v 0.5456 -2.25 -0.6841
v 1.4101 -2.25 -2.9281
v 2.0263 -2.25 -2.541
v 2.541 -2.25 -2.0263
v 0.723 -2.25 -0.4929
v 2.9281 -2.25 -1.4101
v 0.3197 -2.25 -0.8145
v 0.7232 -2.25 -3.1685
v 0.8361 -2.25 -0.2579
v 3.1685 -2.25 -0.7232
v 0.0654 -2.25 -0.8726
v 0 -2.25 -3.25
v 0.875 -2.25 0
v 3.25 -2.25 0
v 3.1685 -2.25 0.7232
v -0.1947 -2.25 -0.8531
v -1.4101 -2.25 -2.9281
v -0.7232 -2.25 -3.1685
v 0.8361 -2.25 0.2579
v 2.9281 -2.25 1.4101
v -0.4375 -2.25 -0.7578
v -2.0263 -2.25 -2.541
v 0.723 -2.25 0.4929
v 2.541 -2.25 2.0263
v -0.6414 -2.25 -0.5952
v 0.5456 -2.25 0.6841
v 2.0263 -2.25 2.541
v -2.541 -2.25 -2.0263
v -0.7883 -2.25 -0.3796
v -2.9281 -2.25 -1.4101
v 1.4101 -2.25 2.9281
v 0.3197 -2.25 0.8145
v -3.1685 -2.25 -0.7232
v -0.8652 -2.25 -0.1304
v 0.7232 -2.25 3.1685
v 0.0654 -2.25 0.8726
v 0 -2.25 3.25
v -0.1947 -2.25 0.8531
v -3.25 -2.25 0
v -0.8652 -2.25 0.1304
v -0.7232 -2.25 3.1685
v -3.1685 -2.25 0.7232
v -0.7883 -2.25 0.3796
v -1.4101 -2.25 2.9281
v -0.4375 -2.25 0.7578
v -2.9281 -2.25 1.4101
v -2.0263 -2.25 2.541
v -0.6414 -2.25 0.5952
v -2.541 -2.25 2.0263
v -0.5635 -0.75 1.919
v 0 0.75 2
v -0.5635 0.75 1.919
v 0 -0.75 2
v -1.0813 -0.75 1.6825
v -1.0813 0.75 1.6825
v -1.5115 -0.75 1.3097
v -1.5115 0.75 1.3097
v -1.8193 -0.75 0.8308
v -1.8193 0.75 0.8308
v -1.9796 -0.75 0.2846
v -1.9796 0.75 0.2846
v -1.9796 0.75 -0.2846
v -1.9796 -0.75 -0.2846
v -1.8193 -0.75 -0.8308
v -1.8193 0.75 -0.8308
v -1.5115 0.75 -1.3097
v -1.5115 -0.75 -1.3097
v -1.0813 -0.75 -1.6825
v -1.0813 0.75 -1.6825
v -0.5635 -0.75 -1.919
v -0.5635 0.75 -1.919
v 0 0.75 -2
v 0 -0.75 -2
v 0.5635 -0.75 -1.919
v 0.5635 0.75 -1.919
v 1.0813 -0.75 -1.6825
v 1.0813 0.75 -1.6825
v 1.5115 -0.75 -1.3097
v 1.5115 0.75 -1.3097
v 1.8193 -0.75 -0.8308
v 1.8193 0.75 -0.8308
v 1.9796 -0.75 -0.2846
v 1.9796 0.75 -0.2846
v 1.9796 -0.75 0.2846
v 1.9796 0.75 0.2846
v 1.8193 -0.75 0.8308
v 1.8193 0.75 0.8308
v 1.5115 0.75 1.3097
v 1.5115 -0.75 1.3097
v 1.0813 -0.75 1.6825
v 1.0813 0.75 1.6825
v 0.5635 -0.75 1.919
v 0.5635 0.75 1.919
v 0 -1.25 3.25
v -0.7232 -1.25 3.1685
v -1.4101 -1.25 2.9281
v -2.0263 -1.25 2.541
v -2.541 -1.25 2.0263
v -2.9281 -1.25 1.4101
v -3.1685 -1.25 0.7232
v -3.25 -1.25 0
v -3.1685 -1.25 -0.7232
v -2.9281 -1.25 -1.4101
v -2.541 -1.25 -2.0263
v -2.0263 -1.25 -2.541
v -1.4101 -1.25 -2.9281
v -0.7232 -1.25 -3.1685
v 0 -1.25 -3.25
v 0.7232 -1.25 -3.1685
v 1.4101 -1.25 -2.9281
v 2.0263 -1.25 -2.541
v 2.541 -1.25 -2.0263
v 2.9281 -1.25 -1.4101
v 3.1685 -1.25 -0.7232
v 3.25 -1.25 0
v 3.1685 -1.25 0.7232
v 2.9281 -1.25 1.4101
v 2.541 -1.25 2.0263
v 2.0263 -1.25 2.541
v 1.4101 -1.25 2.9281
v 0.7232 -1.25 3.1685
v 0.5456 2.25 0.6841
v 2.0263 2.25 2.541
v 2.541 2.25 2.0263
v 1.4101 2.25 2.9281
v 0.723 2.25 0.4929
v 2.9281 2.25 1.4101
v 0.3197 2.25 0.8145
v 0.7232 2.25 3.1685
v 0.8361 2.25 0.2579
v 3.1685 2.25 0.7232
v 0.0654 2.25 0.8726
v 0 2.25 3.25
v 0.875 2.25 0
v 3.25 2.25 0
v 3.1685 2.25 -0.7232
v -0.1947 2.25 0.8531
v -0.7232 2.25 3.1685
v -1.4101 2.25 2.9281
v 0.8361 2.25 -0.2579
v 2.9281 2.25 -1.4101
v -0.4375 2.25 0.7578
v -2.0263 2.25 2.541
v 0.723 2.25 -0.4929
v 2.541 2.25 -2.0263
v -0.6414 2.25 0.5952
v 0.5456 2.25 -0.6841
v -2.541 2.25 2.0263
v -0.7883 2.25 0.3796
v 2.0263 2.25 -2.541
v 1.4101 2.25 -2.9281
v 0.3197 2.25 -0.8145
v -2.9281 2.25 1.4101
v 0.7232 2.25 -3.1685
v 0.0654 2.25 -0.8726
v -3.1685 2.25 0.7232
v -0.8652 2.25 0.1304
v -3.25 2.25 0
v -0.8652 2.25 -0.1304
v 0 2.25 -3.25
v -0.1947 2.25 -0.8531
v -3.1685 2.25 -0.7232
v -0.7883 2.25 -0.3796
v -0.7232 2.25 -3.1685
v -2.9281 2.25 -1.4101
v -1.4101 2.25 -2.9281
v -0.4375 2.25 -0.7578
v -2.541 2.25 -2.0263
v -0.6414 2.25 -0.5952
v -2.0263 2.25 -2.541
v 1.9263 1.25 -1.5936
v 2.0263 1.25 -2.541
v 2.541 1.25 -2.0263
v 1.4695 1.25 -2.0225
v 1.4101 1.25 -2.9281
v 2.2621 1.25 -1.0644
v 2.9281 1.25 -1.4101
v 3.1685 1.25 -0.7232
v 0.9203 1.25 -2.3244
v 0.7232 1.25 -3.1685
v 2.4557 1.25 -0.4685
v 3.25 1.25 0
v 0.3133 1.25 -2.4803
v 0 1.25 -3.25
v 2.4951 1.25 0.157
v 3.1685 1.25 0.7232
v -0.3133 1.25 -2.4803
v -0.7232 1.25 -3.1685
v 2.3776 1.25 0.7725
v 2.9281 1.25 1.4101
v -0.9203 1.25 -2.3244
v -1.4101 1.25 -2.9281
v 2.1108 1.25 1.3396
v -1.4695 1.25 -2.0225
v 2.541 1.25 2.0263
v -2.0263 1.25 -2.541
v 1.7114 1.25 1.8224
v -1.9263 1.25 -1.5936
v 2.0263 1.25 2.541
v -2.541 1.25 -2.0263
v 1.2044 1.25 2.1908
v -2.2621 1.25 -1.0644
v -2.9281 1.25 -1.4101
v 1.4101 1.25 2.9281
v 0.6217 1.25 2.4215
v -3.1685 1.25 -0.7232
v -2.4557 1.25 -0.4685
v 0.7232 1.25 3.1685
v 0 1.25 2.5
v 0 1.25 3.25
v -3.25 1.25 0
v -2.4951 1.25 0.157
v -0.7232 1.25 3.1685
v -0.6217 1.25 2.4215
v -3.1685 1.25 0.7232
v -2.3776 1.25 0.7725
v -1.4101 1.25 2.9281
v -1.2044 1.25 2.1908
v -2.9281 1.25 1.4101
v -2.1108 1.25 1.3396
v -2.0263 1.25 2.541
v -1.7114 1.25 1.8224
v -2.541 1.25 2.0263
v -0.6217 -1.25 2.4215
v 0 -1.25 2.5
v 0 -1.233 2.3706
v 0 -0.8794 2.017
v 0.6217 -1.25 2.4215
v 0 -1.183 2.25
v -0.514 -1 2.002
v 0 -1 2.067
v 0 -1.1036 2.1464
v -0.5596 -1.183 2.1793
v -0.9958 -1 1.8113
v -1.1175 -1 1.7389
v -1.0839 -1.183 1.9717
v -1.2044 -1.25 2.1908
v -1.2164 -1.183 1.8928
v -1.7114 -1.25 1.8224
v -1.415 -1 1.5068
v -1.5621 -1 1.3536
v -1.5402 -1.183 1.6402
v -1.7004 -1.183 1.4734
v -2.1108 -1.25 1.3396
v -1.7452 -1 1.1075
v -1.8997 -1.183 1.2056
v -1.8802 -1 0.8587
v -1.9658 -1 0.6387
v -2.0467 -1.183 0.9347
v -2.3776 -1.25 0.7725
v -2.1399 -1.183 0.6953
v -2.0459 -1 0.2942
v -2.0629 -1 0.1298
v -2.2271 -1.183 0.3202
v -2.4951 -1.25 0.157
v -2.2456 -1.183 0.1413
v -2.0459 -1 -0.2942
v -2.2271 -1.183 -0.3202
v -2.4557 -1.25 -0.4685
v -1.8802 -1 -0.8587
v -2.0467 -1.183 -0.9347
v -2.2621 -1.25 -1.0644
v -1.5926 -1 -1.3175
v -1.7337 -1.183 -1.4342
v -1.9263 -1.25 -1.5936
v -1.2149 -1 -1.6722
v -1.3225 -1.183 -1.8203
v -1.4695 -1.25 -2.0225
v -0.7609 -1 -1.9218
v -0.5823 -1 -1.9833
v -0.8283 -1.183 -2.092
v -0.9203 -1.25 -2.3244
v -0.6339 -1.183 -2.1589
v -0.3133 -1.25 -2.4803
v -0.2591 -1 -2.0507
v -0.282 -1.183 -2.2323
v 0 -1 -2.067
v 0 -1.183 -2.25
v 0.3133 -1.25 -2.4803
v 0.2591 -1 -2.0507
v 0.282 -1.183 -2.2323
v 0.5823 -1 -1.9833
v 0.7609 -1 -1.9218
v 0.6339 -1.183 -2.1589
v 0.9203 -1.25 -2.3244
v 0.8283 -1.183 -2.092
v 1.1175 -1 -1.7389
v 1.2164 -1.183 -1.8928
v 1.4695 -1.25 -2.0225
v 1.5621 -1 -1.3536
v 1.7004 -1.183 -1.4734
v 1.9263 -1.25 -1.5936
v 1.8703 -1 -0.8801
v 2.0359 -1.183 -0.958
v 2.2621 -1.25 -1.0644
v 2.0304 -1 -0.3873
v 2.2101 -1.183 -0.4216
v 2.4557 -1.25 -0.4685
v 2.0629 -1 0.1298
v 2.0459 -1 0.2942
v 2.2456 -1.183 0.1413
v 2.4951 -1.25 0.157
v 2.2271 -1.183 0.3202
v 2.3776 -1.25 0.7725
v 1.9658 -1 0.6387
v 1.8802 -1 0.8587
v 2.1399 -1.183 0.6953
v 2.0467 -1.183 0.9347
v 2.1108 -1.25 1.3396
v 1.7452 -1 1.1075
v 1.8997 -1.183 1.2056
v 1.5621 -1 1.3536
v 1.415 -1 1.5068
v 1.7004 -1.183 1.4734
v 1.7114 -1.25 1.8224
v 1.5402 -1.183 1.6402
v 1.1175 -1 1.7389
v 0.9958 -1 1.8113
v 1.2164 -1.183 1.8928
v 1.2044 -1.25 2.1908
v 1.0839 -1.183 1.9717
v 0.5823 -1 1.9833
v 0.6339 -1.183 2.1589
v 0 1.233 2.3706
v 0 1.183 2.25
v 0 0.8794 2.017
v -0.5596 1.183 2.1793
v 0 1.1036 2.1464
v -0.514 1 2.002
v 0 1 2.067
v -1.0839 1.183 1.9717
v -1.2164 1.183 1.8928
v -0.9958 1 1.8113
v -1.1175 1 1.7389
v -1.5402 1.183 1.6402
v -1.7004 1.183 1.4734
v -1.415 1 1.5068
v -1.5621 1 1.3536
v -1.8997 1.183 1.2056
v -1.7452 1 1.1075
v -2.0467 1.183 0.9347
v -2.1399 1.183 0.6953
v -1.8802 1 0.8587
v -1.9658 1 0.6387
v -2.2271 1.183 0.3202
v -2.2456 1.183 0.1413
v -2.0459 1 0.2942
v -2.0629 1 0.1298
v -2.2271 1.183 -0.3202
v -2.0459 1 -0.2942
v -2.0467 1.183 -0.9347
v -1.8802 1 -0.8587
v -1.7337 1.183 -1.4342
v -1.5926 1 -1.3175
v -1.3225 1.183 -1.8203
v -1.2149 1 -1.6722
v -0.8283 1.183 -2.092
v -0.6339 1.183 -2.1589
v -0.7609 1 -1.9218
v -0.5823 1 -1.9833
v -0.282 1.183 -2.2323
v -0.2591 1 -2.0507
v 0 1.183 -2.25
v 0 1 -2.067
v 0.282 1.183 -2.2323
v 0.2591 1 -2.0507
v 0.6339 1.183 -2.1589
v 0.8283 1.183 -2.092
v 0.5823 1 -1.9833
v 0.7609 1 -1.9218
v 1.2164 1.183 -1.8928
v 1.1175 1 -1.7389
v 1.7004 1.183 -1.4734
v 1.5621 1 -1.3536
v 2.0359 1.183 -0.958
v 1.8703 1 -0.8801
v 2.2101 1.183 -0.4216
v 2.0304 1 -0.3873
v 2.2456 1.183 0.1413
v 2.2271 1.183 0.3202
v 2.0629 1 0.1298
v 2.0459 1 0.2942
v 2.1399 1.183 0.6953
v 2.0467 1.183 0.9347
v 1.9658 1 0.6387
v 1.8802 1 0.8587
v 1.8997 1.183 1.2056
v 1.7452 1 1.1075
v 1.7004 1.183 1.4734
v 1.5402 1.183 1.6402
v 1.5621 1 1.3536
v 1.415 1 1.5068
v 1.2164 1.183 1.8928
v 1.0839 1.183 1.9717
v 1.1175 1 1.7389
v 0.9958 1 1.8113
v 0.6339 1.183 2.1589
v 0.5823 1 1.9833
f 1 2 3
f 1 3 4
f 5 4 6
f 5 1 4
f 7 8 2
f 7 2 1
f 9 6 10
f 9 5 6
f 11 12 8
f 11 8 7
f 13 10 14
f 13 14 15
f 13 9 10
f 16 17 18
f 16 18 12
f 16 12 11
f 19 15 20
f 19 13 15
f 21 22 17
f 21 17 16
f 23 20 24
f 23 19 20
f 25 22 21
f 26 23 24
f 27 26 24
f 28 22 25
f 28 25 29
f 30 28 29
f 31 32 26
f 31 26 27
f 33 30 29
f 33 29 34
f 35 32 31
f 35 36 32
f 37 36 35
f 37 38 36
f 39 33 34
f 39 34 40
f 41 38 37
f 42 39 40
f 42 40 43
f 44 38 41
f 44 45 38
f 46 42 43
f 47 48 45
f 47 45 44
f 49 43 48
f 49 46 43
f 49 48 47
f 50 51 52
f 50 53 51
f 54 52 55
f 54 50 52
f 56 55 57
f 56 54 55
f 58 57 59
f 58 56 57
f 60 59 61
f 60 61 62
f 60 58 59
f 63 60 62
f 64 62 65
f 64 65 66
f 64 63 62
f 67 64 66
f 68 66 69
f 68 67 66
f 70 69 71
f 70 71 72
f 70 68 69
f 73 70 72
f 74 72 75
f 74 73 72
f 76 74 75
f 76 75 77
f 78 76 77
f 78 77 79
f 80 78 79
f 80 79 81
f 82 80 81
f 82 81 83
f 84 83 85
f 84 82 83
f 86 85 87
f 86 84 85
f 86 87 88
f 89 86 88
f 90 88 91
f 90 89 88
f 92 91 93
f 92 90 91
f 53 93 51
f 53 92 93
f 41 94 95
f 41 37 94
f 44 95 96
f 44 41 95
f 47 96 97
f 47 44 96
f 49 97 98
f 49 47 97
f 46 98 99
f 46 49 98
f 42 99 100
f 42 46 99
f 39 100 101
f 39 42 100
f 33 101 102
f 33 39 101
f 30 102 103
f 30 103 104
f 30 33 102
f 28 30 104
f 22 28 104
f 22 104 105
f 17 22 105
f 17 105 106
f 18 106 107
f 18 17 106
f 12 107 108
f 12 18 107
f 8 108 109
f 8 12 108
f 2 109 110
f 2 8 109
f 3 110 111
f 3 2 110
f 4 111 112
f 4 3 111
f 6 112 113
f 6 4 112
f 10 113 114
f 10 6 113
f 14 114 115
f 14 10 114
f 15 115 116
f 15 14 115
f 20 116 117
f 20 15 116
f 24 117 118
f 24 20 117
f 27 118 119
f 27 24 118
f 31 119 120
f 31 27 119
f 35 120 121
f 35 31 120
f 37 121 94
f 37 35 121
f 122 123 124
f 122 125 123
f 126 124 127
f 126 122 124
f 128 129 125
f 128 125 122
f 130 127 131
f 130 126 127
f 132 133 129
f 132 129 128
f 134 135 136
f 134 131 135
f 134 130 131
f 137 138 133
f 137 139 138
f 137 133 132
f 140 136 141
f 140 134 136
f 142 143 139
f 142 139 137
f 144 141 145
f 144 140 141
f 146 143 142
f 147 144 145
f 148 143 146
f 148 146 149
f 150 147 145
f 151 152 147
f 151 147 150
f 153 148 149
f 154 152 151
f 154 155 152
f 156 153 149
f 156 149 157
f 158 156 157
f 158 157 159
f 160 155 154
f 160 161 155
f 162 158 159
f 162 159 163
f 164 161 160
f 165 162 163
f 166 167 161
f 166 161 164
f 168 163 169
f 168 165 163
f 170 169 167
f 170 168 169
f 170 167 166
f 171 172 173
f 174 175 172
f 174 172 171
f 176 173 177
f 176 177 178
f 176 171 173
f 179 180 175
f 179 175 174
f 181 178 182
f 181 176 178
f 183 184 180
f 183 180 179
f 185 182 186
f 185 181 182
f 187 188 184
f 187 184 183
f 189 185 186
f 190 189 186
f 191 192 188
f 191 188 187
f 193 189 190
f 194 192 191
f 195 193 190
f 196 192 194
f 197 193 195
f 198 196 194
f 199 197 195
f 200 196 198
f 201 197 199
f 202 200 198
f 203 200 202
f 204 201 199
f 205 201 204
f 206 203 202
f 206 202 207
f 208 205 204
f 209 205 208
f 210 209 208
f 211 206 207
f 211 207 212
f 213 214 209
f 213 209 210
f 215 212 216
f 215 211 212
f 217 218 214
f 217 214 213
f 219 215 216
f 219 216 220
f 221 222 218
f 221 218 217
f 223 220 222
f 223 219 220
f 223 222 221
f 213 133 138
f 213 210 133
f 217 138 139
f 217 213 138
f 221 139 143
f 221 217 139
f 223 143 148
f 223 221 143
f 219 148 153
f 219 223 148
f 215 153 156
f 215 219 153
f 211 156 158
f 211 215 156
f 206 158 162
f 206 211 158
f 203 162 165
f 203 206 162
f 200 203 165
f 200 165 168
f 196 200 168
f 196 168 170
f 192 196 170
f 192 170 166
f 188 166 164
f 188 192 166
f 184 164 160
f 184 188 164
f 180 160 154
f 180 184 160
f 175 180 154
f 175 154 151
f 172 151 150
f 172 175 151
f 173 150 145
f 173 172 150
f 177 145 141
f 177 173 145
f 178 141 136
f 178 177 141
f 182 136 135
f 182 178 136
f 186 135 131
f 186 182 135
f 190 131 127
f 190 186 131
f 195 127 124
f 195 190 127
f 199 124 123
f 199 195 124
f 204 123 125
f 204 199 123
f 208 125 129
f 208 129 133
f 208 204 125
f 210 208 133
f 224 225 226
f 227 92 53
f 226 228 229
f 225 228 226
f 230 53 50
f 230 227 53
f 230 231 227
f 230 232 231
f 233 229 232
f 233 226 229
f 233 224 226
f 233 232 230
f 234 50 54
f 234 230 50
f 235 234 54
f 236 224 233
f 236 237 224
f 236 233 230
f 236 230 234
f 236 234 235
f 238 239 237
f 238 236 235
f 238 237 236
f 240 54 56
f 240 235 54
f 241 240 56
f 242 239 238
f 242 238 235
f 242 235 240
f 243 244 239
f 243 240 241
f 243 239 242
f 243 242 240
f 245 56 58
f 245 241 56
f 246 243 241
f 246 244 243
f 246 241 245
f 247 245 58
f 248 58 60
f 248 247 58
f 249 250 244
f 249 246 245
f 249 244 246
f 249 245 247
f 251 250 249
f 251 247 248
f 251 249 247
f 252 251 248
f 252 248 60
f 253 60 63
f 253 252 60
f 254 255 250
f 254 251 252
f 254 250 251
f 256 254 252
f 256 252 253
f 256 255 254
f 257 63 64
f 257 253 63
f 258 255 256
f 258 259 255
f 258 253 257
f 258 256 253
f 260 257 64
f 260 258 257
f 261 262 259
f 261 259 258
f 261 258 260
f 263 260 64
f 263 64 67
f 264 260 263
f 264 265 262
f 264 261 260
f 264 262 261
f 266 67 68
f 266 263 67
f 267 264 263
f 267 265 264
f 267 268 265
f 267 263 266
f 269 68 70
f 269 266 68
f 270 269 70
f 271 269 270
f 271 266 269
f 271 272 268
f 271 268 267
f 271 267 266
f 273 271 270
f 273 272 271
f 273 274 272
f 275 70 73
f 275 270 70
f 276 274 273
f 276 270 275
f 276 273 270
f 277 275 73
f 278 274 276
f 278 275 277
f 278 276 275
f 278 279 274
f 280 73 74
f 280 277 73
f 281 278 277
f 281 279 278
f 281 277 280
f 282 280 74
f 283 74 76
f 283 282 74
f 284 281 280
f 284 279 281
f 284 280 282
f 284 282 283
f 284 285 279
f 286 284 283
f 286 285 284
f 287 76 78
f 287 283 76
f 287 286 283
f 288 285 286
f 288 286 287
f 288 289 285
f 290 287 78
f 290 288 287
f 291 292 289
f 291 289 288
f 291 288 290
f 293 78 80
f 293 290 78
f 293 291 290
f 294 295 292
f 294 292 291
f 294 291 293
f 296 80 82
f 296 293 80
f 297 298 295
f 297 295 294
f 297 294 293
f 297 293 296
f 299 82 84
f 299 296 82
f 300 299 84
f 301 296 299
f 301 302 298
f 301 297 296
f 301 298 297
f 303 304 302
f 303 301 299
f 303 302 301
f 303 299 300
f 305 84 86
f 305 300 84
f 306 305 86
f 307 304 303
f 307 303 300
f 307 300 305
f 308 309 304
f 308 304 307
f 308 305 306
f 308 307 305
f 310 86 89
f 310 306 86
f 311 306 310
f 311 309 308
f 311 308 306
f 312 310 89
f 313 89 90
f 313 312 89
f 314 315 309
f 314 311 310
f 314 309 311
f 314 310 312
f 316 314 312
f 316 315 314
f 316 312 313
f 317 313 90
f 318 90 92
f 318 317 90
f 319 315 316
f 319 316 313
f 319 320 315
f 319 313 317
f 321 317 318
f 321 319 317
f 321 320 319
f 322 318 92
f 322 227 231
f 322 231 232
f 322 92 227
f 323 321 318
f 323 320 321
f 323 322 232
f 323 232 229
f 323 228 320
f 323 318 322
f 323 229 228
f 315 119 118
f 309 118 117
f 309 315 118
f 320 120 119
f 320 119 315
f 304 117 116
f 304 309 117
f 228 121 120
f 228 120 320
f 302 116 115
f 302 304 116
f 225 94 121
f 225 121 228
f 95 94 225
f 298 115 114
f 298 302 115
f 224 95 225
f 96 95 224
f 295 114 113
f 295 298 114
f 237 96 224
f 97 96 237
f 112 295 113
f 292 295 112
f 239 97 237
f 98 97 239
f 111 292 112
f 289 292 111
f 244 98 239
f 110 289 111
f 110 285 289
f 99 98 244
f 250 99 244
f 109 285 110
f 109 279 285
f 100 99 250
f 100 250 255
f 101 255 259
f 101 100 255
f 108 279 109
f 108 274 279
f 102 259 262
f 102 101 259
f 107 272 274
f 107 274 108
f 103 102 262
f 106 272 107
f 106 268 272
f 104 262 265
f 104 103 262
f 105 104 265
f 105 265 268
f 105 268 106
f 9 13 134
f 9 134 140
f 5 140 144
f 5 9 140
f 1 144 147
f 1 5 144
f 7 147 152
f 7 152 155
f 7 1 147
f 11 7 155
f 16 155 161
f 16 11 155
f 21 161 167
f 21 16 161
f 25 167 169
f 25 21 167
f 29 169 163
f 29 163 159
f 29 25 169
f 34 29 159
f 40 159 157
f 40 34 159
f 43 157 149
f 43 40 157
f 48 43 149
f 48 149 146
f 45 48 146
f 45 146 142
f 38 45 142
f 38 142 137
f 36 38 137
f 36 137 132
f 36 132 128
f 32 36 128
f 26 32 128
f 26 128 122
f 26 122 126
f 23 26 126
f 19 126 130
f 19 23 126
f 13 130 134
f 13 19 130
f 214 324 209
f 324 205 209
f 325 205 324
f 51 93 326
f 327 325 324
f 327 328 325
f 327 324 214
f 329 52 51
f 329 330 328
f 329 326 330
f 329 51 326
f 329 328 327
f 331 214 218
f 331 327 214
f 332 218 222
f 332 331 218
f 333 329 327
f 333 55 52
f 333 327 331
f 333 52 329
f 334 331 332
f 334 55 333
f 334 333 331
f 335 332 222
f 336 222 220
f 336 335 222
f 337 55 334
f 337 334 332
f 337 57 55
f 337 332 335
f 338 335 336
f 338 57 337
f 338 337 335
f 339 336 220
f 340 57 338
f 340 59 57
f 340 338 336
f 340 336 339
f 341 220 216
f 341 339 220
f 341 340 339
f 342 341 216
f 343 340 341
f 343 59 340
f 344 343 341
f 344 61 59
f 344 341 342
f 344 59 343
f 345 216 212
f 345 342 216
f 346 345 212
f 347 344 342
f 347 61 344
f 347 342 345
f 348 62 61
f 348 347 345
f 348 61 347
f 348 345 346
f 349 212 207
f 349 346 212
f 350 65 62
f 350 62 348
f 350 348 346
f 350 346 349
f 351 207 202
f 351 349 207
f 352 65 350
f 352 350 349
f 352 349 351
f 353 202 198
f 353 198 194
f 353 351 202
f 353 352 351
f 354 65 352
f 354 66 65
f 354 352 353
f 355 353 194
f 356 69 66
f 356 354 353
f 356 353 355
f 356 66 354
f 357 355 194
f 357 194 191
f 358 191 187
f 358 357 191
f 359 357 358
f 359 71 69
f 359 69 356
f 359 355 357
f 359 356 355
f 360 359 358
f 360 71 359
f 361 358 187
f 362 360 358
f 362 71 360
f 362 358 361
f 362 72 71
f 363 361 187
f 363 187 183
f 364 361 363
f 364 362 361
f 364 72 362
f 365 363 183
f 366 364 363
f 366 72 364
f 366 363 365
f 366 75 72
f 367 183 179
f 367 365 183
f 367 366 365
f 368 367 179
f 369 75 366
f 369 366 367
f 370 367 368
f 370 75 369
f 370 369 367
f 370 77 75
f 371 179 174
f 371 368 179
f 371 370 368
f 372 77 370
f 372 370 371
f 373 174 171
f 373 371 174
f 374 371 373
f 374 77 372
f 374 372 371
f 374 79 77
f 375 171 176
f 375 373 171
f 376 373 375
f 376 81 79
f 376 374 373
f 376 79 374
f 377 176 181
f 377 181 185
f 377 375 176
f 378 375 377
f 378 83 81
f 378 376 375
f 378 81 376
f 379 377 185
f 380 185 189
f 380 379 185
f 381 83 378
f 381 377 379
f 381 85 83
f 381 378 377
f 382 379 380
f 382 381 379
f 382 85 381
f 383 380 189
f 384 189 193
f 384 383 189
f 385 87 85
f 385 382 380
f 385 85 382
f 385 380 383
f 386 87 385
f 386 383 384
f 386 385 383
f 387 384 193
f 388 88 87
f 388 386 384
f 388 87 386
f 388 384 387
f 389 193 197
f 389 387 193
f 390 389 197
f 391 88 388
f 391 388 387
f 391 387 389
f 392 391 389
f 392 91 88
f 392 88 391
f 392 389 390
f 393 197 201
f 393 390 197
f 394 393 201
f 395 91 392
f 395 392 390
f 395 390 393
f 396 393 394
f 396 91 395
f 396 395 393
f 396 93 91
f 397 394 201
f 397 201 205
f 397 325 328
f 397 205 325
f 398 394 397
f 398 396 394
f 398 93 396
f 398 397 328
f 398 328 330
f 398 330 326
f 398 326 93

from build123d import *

# Parameters (mm, degrees)
HUB_START          = -2.25
HUB_HOLE_OUTLINE_R = 0.875
HUB_HOLE_DEPTH     = 4.5


# Read off the part's stored shape, not the designer's step: Hub Hole
with BuildPart() as part:
    # Sketch3 → Revolve1 (revolve)
    with BuildSketch(Plane(origin=(0, 0, 0), x_dir=(0, 0, -1), z_dir=(1, 0, 0)), mode=Mode.PRIVATE) as revolve1_sk:
        with BuildLine():
            Line((0, 2.25), (3.25, 2.25))
            Line((3.25, 2.25), (3.25, 1.25))
            Line((3.25, 1.25), (2.5, 1.25))
            ThreePointArc((2.5, 1.25), (2.146446609, 1.103553391), (2, 0.75))
            Line((2, 0.75), (2, -0.75))
            ThreePointArc((2, -0.75), (2.146446609, -1.103553391), (2.5, -1.25))
            Line((2.5, -1.25), (3.25, -1.25))
            Line((3.25, -1.25), (3.25, -2.25))
            Line((3.25, -2.25), (0, -2.25))
            Line((0, -2.25), (0, 2.25))
        make_face()
    revolve(revolve1_sk.sketch.rotate(Axis((0, 2.25, 0), (0, -1, 0)), 180), axis=Axis((0, 2.25, 0), (0, -1, 0)))

    # Hub Hole outline → Hub Hole (cut)
    with BuildSketch(Plane(origin=(0, 0, 0), x_dir=(1, 0, 0), z_dir=(0, 1, 0)).offset(HUB_START)):
        Circle(HUB_HOLE_OUTLINE_R)
    extrude(amount=HUB_HOLE_DEPTH, mode=Mode.SUBTRACT)


solid = part.part
